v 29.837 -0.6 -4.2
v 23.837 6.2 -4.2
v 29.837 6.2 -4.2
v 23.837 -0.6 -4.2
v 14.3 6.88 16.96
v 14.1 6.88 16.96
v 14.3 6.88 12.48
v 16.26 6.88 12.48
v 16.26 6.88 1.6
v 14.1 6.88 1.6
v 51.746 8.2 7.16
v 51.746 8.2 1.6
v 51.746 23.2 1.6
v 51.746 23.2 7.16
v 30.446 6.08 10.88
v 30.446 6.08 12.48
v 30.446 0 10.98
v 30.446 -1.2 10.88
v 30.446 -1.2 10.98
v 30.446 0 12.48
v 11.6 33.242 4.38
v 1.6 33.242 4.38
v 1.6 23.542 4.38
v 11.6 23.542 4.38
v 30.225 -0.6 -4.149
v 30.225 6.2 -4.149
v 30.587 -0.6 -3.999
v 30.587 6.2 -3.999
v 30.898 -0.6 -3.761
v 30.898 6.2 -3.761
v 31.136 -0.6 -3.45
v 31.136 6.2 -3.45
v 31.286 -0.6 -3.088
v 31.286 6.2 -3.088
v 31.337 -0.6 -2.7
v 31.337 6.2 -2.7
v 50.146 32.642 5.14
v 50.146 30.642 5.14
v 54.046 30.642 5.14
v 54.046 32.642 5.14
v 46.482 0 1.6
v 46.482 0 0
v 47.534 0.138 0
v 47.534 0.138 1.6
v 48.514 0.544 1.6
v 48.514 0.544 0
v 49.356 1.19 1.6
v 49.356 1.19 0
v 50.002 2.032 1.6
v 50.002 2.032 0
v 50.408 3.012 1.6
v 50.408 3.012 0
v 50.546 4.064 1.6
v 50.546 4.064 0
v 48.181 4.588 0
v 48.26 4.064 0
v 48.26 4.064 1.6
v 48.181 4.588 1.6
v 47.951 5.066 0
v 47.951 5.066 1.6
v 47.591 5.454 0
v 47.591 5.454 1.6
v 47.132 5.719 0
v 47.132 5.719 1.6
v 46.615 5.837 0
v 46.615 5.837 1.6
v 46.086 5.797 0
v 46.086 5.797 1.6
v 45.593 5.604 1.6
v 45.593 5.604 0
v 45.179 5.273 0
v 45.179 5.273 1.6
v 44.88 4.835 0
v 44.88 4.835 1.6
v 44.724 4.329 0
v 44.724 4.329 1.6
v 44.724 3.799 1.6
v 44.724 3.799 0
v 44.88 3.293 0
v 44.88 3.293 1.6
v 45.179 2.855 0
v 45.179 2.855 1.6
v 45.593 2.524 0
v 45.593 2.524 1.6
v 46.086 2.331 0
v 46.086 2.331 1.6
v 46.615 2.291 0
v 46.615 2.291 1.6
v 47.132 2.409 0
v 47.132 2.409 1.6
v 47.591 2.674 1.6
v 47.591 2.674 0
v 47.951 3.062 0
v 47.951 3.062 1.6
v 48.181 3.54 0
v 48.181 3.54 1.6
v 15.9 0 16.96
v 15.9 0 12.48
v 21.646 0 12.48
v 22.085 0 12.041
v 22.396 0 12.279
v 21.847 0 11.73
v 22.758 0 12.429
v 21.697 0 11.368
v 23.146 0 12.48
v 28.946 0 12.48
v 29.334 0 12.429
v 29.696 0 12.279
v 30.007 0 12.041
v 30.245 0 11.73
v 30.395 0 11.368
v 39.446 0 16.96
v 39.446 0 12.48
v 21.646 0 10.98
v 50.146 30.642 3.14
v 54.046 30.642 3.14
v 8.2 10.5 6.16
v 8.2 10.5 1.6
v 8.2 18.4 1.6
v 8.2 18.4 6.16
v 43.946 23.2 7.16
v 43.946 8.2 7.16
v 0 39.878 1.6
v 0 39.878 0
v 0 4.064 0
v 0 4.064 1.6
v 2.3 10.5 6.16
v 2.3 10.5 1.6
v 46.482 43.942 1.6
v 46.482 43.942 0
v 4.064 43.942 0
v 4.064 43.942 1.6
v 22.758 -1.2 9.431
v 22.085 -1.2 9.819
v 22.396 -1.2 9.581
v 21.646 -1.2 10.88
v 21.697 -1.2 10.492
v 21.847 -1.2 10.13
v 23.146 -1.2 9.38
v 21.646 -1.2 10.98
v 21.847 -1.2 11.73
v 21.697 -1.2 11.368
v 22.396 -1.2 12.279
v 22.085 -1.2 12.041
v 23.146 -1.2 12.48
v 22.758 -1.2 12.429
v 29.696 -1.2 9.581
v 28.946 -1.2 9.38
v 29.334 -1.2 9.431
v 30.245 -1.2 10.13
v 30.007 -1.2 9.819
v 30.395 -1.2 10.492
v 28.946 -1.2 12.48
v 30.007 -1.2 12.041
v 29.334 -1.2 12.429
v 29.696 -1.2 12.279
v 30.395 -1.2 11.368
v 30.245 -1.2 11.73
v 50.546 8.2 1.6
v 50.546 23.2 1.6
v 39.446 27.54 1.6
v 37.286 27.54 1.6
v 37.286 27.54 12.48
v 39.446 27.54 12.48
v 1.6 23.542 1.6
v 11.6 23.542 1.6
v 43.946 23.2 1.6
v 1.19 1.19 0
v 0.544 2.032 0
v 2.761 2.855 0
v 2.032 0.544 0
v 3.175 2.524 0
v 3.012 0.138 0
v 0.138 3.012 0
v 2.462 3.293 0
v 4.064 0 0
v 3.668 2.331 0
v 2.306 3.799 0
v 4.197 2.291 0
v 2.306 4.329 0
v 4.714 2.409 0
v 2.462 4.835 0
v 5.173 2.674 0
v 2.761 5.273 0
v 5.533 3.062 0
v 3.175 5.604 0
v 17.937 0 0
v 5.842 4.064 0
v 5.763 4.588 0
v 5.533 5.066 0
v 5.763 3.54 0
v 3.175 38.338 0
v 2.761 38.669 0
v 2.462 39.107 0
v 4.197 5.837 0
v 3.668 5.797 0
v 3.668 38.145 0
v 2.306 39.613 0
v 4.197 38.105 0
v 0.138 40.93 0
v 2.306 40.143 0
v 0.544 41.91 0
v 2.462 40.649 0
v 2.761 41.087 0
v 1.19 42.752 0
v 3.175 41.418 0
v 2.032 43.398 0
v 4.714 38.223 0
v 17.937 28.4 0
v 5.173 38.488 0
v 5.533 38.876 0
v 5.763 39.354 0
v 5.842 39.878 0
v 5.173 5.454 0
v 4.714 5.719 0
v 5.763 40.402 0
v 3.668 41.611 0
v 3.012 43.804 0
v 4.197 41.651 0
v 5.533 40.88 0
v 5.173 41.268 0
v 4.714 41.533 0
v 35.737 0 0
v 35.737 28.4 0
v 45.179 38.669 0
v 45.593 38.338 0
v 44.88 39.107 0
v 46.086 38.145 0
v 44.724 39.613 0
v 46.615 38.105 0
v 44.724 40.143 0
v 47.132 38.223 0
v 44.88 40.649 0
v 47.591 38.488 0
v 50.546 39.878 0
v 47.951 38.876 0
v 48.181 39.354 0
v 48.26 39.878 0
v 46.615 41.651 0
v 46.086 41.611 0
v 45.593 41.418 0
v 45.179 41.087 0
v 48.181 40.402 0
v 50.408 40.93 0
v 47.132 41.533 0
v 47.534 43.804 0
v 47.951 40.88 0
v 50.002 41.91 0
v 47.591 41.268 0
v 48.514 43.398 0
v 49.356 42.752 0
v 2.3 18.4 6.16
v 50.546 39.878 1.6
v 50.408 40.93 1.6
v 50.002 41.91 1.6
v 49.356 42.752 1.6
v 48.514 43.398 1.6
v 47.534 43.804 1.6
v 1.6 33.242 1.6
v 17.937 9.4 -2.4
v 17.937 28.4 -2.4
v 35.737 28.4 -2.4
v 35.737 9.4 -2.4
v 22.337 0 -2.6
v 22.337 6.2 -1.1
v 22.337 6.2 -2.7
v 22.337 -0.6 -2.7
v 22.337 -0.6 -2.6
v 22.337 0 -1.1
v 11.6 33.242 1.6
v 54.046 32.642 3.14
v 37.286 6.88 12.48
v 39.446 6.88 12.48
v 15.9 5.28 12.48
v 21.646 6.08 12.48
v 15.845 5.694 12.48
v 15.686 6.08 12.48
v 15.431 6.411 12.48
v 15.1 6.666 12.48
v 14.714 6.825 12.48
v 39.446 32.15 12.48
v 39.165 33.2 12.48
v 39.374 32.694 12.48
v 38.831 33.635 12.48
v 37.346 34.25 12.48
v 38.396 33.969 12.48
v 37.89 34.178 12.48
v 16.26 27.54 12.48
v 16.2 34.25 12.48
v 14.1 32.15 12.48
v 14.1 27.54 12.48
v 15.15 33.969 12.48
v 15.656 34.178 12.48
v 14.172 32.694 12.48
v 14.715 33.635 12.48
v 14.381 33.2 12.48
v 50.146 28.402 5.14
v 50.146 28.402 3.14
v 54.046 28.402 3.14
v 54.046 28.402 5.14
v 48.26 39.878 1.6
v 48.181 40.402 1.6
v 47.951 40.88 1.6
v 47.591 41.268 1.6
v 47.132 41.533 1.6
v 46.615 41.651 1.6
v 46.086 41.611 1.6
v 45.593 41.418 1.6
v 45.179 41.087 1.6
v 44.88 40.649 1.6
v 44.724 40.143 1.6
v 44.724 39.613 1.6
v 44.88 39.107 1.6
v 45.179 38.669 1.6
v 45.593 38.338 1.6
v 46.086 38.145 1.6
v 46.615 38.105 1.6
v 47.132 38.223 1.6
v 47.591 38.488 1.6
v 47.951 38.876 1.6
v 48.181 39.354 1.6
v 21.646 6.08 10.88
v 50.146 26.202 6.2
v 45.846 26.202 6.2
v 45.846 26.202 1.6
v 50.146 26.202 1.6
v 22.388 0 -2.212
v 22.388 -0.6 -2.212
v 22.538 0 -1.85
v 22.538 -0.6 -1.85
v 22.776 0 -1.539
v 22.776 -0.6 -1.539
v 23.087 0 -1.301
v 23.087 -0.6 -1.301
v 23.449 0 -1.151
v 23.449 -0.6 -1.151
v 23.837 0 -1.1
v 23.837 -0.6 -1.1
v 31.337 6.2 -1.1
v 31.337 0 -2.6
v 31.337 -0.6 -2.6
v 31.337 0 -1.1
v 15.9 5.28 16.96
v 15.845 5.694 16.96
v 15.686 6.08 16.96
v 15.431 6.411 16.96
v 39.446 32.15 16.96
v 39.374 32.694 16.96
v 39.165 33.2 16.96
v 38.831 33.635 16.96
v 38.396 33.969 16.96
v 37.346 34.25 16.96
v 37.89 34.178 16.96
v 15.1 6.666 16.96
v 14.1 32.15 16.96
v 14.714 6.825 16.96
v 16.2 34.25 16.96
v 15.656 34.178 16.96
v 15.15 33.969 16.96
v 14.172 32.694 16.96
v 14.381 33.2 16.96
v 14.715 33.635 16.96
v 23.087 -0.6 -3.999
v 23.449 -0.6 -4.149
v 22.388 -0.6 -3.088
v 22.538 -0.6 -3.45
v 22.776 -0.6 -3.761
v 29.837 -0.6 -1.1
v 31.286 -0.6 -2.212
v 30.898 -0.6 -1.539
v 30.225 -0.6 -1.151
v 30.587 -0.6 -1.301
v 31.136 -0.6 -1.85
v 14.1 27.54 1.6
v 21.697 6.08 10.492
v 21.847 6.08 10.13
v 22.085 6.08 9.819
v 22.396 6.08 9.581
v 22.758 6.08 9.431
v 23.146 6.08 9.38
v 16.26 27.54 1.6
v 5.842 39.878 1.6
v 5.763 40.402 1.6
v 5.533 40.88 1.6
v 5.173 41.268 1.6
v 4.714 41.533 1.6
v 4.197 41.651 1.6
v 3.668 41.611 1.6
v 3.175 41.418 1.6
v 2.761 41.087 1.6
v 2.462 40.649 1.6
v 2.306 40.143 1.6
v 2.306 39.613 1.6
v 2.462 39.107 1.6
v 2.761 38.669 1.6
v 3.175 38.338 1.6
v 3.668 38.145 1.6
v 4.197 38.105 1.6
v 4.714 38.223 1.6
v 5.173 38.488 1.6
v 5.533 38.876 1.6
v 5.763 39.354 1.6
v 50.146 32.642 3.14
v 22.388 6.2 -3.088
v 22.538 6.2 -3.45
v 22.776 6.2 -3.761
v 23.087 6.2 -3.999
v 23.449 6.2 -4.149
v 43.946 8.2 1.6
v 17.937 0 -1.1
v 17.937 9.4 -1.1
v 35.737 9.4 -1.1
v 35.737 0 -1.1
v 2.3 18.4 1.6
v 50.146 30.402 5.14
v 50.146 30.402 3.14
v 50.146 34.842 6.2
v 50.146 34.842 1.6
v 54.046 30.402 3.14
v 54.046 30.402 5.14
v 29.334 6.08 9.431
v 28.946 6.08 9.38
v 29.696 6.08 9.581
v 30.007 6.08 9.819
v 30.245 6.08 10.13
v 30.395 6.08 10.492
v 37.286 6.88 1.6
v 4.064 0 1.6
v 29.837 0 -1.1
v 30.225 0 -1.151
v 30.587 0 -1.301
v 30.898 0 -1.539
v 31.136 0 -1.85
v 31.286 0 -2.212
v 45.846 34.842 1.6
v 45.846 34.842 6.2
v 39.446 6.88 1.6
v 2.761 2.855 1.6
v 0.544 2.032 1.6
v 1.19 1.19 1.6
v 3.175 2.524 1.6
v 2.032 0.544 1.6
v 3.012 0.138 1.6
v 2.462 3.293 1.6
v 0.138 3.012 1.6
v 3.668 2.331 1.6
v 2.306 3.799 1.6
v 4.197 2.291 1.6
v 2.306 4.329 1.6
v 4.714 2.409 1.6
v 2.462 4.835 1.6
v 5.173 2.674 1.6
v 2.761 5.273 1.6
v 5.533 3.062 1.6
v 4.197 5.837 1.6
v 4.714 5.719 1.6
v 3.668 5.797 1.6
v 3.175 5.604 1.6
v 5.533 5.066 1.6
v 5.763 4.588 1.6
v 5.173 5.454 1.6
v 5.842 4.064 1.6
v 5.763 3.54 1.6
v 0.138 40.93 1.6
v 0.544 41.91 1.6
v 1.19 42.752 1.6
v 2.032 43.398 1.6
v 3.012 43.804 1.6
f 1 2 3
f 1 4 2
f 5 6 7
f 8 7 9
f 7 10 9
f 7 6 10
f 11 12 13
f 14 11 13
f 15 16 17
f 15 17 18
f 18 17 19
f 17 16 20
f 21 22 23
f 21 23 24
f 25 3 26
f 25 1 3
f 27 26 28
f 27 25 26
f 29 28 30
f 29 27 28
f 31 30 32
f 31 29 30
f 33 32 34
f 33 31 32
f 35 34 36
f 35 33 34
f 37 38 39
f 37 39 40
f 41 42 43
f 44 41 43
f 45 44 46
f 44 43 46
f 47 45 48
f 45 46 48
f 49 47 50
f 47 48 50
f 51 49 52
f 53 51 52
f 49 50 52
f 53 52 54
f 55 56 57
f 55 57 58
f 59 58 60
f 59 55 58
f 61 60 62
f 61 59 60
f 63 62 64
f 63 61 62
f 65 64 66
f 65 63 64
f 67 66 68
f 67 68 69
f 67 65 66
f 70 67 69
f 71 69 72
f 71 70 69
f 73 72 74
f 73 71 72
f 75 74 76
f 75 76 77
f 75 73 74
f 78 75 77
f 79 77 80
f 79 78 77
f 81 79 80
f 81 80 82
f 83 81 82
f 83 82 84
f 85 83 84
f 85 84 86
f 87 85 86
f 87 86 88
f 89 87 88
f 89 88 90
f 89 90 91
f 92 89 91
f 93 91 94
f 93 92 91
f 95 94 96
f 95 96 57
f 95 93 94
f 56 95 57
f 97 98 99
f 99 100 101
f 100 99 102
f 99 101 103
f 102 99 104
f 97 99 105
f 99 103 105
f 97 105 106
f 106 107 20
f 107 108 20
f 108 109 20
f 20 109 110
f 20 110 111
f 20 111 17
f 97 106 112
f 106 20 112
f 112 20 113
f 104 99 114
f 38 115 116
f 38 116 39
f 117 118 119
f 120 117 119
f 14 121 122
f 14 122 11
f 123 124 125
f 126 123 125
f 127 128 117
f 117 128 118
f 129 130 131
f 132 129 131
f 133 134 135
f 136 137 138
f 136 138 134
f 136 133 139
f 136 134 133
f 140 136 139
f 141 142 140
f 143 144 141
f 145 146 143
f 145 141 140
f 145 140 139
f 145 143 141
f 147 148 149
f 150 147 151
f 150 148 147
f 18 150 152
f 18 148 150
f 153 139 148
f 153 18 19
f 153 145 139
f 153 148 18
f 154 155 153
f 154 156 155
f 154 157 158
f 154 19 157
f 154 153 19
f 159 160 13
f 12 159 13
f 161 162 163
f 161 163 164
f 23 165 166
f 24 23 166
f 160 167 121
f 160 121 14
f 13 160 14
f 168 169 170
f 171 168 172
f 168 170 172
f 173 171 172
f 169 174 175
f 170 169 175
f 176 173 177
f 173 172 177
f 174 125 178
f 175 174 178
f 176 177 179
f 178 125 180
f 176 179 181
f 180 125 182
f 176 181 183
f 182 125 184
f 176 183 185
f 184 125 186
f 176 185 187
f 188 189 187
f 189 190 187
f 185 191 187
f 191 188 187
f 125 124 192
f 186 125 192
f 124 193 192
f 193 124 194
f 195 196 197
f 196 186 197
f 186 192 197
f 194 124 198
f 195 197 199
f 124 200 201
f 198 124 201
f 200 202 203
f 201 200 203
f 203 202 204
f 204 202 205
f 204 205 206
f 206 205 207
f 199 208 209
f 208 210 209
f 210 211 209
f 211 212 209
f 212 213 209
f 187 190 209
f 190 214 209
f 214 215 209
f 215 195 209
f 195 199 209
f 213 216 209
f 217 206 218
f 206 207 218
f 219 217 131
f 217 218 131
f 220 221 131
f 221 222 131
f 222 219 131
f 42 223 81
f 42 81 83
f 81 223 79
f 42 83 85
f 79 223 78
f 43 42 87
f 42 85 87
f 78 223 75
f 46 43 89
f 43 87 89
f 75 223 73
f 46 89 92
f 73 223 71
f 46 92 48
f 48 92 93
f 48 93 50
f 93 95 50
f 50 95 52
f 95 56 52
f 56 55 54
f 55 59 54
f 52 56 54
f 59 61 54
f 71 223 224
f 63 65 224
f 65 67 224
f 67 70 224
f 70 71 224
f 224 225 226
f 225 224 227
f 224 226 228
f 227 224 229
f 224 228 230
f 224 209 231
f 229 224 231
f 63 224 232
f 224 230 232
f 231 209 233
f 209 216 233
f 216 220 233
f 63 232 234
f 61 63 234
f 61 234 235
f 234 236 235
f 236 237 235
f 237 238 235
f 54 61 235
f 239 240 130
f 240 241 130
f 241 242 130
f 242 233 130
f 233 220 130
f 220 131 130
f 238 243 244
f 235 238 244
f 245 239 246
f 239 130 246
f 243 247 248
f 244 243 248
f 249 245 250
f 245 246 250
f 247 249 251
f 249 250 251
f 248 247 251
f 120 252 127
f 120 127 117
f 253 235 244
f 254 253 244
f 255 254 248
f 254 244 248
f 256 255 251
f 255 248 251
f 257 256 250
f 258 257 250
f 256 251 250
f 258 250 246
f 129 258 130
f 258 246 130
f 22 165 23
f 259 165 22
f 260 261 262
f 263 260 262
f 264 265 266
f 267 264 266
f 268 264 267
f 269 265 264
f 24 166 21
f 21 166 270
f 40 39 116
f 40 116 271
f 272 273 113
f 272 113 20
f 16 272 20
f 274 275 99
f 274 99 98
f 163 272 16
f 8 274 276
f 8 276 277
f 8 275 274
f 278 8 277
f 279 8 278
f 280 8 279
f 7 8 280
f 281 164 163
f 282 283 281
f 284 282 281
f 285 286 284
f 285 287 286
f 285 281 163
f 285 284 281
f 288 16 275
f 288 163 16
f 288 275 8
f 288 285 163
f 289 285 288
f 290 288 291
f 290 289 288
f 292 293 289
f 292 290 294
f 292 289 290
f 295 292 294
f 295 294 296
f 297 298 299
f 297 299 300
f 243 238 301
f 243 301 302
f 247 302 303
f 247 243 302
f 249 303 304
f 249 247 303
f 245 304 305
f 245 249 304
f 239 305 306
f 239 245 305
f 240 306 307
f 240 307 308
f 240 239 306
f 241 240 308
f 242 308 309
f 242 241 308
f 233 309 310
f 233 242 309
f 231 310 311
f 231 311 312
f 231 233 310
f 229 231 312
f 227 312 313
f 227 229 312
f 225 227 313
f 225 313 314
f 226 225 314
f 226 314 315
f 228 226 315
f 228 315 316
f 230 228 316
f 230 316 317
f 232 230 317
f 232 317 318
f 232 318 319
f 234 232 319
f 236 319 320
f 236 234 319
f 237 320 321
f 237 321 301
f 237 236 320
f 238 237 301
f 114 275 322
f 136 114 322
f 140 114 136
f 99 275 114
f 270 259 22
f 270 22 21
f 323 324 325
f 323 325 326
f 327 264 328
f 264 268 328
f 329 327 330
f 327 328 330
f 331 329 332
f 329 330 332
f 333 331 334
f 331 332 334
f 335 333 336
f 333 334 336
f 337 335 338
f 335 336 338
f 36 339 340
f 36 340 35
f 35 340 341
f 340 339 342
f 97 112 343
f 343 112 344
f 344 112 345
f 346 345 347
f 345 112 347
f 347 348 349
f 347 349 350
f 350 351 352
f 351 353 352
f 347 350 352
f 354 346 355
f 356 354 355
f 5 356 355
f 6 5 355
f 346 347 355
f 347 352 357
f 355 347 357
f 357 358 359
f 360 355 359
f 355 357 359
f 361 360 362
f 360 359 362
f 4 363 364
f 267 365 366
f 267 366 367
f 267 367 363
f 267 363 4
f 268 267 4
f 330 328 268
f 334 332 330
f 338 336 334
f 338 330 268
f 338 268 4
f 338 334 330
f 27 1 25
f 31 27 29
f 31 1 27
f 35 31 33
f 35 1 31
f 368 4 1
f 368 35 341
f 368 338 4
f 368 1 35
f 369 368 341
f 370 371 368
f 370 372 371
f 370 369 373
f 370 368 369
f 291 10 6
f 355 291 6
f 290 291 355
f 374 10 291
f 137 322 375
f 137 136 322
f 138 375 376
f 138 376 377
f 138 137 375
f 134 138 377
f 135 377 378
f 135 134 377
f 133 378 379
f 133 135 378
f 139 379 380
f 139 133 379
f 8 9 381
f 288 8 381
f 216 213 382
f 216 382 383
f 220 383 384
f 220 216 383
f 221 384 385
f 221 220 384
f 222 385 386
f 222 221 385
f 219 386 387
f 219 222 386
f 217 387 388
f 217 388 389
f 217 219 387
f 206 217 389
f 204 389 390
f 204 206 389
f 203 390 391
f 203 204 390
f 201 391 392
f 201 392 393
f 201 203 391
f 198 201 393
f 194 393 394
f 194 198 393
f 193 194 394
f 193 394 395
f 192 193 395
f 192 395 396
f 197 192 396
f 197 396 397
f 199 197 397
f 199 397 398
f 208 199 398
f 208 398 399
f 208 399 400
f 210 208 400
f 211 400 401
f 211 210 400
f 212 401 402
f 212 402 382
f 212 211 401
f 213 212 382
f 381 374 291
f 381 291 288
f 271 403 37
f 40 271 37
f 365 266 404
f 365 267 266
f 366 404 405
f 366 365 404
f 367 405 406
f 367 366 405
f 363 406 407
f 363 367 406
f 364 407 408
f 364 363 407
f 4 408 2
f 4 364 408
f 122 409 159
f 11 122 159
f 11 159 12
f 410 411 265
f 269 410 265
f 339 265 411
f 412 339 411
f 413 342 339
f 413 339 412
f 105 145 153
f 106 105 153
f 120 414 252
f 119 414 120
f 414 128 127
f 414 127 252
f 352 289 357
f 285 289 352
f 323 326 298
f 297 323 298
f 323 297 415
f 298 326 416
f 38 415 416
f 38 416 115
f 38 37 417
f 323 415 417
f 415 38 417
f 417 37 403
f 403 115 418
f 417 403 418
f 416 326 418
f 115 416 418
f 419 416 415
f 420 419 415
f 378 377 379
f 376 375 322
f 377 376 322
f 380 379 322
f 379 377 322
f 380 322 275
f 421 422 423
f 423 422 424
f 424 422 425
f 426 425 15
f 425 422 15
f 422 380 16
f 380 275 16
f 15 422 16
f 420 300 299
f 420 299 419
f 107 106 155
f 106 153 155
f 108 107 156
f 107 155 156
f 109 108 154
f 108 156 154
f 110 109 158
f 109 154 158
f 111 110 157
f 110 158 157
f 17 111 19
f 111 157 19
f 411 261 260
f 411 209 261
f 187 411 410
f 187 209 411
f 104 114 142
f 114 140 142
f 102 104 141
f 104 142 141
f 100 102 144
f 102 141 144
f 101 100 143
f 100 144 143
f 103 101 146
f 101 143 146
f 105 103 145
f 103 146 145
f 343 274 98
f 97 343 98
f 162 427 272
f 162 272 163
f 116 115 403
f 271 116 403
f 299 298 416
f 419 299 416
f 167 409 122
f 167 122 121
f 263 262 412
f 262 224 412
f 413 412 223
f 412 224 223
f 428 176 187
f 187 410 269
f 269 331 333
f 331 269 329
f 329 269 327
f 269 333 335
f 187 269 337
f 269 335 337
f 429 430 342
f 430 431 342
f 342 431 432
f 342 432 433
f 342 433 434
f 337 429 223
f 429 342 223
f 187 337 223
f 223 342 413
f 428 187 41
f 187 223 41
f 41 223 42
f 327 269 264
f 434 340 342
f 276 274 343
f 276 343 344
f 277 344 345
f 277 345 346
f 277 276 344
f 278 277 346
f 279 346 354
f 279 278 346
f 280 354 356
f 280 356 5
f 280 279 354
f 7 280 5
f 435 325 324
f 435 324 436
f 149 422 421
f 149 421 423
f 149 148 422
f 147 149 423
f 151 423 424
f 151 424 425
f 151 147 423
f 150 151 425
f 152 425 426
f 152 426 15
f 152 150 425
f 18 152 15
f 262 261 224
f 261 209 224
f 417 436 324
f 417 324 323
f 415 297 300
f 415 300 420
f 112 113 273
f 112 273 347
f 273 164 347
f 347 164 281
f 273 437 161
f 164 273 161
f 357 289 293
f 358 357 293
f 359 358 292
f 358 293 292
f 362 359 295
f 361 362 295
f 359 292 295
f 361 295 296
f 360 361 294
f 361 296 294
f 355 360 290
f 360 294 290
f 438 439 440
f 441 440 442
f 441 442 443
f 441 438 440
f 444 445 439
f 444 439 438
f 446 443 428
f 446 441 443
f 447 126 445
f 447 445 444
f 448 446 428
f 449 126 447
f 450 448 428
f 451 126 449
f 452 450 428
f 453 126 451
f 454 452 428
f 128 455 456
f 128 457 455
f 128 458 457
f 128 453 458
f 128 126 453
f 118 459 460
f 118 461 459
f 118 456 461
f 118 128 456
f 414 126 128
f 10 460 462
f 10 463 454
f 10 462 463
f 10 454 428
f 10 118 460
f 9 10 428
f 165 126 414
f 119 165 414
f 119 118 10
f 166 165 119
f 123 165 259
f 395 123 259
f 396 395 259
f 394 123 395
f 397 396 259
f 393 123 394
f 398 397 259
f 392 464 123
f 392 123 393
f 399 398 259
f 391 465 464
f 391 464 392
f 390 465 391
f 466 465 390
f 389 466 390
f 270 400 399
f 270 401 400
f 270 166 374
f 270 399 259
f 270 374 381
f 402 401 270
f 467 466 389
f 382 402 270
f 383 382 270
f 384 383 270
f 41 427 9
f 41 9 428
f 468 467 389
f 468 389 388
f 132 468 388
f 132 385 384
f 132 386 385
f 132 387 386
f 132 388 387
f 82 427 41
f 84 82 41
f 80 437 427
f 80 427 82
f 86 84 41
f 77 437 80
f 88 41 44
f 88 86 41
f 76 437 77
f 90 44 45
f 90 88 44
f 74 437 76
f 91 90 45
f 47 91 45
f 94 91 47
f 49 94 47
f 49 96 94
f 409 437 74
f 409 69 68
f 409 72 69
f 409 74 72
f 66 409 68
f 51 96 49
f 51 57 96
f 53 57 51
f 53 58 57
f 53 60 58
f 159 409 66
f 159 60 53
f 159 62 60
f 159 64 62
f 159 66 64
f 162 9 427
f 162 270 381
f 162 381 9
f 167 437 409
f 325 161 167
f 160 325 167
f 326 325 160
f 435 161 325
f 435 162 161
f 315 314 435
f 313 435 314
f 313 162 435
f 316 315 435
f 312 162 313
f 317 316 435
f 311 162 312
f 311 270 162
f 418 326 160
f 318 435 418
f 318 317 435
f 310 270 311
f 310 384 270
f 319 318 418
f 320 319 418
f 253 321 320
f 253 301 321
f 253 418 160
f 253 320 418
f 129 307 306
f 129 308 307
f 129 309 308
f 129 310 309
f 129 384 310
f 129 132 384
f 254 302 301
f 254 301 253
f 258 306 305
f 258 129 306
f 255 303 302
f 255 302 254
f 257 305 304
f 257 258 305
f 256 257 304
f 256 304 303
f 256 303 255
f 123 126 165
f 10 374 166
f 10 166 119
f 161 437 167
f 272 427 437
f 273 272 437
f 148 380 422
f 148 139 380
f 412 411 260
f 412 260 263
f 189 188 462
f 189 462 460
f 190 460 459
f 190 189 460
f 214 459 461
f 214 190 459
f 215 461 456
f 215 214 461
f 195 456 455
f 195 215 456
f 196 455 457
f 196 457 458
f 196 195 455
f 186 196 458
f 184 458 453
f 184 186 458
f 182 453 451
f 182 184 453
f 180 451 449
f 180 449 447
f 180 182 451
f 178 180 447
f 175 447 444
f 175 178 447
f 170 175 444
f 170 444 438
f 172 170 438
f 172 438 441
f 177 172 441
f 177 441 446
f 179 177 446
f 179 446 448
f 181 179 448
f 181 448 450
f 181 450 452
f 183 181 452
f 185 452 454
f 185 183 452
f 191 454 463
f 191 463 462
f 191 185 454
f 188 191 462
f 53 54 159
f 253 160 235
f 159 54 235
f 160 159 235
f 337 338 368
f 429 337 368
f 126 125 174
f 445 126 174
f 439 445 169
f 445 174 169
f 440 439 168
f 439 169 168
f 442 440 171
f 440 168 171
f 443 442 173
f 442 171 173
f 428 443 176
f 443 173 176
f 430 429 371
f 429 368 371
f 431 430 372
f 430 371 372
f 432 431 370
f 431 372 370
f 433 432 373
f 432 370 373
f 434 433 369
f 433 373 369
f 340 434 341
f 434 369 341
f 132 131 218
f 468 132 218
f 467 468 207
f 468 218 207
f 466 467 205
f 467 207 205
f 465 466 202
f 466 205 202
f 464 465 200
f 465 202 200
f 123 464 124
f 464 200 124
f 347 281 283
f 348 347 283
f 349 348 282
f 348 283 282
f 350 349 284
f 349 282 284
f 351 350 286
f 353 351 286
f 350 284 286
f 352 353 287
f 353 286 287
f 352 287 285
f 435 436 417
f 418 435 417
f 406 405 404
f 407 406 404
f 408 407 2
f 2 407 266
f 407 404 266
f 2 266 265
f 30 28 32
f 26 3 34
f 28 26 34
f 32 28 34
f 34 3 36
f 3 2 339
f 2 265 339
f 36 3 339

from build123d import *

# Parameters (mm, degrees)
SKETCH_R     = 1.778
PAD_DEPTH    = 1.6
SKETCH001_W  = 2.16
SKETCH001_H  = 20.66
PAD001_DEPTH = 10.88
PAD002_DEPTH = 4.48
SKETCH003_W  = 8.8
SKETCH003_H  = 7.28
PAD003_DEPTH = 3.1
FILLET_R     = 1.5
SKETCH004_W  = 17.8
SKETCH004_H  = 28.4
PAD004_DEPTH = 1.1
SKETCH005_W  = 9
SKETCH005_H  = 6.8
PAD005_DEPTH = 3.1
FILLET001_R  = 1.5
SKETCH006_W  = 7.8
SKETCH006_H  = 15
PAD006_DEPTH = 5.56
SKETCH007_W  = 4.3
SKETCH007_H  = 8.64
PAD007_DEPTH = 4.6
SKETCH008_W  = 2
SKETCH008_H  = 2
PAD008_DEPTH = 3.9
SKETCH009_W  = 5.9
SKETCH009_H  = 7.9
PAD009_DEPTH = 4.56
SKETCH010_W  = 10
SKETCH010_H  = 9.7
PAD010_DEPTH = 2.78
SKETCH011_W  = 17.8
SKETCH011_H  = 19
PAD011_DEPTH = 1.3


with BuildPart() as part:
    # Sketch → Pad (new body)
    with BuildSketch(Plane.XY):
        with BuildLine():
            Line((4.064, 0), (46.482, 0))
            ThreePointArc((46.482, 0), (49.355682, 1.190318), (50.546, 4.064))
            Line((50.546, 4.064), (50.546, 39.878))
            ThreePointArc((50.546, 39.878), (49.355682, 42.751682), (46.482, 43.942))
            Line((46.482, 43.942), (4.064, 43.942))
            ThreePointArc((4.064, 43.942), (1.190318, 42.751682), (0, 39.878))
            Line((0, 39.878), (0, 4.064))
            ThreePointArc((0, 4.064), (1.190318, 1.190318), (4.064, 0))
        make_face()
        with Locations((4.064, 39.878)):
            Circle(SKETCH_R, mode=Mode.SUBTRACT)
        with Locations((46.482, 39.878)):
            Circle(SKETCH_R, mode=Mode.SUBTRACT)
        with Locations((46.482, 4.064)):
            Circle(SKETCH_R, mode=Mode.SUBTRACT)
        with Locations((4.064, 4.064)):
            Circle(SKETCH_R, mode=Mode.SUBTRACT)
    extrude(amount=PAD_DEPTH)

    # Sketch001 (on Face14 of Pad) → Pad001 (join)
    with BuildSketch(Plane.XY.offset(1.6)):
        with Locations((15.18, 17.21)):
            Rectangle(SKETCH001_W, SKETCH001_H)
        with Locations((38.366, 17.21)):
            Rectangle(SKETCH001_W, SKETCH001_H)
    extrude(amount=PAD001_DEPTH)

    # Sketch002 (on Face23 of Pad001) → Pad002 (join)
    with BuildSketch(Plane.XY.offset(12.48)):
        with BuildLine():
            Line((14.1, 6.88), (14.1, 32.15))
            ThreePointArc((16.2, 34.25), (14.715076, 33.634924), (14.1, 32.15))
            Line((16.2, 34.25), (37.346, 34.25))
            ThreePointArc((39.446, 32.15), (38.830924, 33.634924), (37.346, 34.25))
            Line((39.446, 0), (39.446, 32.15))
            Line((15.9, 0), (39.446, 0))
            Line((15.9, 5.28), (15.9, 0))
            ThreePointArc((15.9, 5.28), (15.431371, 6.411371), (14.3, 6.88))
            Line((14.1, 6.88), (14.3, 6.88))
        make_face()
    extrude(amount=PAD002_DEPTH)

    # Sketch003 (on Face24 of Pad002) → Pad003 (join)
    with BuildSketch(Plane(origin=(0, 0, 12.48), x_dir=(1, 0, 0), z_dir=(0, 0, -1))):
        with Locations((26.046, -2.44)):
            Rectangle(SKETCH003_W, SKETCH003_H)
    extrude(amount=PAD003_DEPTH)

    # Fillet
    fillet_edges = [part.edges().sort_by_distance(p)[0] for p in [
        (21.646, -0.6, 12.48),
        (30.446, -0.6, 12.48),
        (30.446, 2.44, 9.38),
        (21.646, 2.44, 9.38),
    ]]
    fillet(fillet_edges, radius=FILLET_R)

    # Sketch004 (on Face43 of Fillet) → Pad004 (join)
    with BuildSketch(Plane(origin=(0, 0, 0), x_dir=(1, 0, 0), z_dir=(0, 0, -1))):
        with Locations((26.837, -14.2)):
            Rectangle(SKETCH004_W, SKETCH004_H)
    extrude(amount=PAD004_DEPTH)

    # Sketch005 (on Face48 of Pad004) → Pad005 (join)
    with BuildSketch(Plane(origin=(0, 0, -1.1), x_dir=(1, 0, 0), z_dir=(0, 0, -1))):
        with Locations((26.837, -2.8)):
            Rectangle(SKETCH005_W, SKETCH005_H)
    extrude(amount=PAD005_DEPTH)

    # Fillet001
    fillet001_edges = [part.edges().sort_by_distance(p)[0] for p in [
        (31.337, -0.3, -1.1),
        (22.337, -0.3, -1.1),
        (31.337, 2.8, -4.2),
        (22.337, 2.8, -4.2),
    ]]
    fillet(fillet001_edges, radius=FILLET001_R)

    # Sketch006 (on Face19 of Fillet001) → Pad006 (join)
    with BuildSketch(Plane.XY.offset(1.6)):
        with Locations((47.846, 15.7)):
            Rectangle(SKETCH006_W, SKETCH006_H)
    extrude(amount=PAD006_DEPTH)

    # Sketch007 (on Face19 of Pad006) → Pad007 (join)
    with BuildSketch(Plane.XY.offset(1.6)):
        with Locations((47.996, 30.522)):
            Rectangle(SKETCH007_W, SKETCH007_H)
    extrude(amount=PAD007_DEPTH)

    # Sketch008 (on Face43 of Pad007) → Pad008 (join)
    with BuildSketch(Plane.YZ.offset(50.146)):
        with Locations((31.642, 4.14)):
            Rectangle(SKETCH008_W, SKETCH008_H)
        with Locations((29.402, 4.14)):
            Rectangle(SKETCH008_W, SKETCH008_H)
    extrude(amount=PAD008_DEPTH)

    # Sketch009 (on Face19 of Pad008) → Pad009 (join)
    with BuildSketch(Plane.XY.offset(1.6)):
        with Locations((5.25, 14.45)):
            Rectangle(SKETCH009_W, SKETCH009_H)
    extrude(amount=PAD009_DEPTH)

    # Sketch010 (on Face19 of Pad009) → Pad010 (join)
    with BuildSketch(Plane.XY.offset(1.6)):
        with Locations((6.6, 28.392)):
            Rectangle(SKETCH010_W, SKETCH010_H)
    extrude(amount=PAD010_DEPTH)

    # Sketch011 (on Face7 of Pad010) → Pad011 (join)
    with BuildSketch(Plane(origin=(0, 0, -1.1), x_dir=(1, 0, 0), z_dir=(0, 0, -1))):
        with Locations((26.837, -18.9)):
            Rectangle(SKETCH011_W, SKETCH011_H)
    extrude(amount=PAD011_DEPTH)


solid = part.part
